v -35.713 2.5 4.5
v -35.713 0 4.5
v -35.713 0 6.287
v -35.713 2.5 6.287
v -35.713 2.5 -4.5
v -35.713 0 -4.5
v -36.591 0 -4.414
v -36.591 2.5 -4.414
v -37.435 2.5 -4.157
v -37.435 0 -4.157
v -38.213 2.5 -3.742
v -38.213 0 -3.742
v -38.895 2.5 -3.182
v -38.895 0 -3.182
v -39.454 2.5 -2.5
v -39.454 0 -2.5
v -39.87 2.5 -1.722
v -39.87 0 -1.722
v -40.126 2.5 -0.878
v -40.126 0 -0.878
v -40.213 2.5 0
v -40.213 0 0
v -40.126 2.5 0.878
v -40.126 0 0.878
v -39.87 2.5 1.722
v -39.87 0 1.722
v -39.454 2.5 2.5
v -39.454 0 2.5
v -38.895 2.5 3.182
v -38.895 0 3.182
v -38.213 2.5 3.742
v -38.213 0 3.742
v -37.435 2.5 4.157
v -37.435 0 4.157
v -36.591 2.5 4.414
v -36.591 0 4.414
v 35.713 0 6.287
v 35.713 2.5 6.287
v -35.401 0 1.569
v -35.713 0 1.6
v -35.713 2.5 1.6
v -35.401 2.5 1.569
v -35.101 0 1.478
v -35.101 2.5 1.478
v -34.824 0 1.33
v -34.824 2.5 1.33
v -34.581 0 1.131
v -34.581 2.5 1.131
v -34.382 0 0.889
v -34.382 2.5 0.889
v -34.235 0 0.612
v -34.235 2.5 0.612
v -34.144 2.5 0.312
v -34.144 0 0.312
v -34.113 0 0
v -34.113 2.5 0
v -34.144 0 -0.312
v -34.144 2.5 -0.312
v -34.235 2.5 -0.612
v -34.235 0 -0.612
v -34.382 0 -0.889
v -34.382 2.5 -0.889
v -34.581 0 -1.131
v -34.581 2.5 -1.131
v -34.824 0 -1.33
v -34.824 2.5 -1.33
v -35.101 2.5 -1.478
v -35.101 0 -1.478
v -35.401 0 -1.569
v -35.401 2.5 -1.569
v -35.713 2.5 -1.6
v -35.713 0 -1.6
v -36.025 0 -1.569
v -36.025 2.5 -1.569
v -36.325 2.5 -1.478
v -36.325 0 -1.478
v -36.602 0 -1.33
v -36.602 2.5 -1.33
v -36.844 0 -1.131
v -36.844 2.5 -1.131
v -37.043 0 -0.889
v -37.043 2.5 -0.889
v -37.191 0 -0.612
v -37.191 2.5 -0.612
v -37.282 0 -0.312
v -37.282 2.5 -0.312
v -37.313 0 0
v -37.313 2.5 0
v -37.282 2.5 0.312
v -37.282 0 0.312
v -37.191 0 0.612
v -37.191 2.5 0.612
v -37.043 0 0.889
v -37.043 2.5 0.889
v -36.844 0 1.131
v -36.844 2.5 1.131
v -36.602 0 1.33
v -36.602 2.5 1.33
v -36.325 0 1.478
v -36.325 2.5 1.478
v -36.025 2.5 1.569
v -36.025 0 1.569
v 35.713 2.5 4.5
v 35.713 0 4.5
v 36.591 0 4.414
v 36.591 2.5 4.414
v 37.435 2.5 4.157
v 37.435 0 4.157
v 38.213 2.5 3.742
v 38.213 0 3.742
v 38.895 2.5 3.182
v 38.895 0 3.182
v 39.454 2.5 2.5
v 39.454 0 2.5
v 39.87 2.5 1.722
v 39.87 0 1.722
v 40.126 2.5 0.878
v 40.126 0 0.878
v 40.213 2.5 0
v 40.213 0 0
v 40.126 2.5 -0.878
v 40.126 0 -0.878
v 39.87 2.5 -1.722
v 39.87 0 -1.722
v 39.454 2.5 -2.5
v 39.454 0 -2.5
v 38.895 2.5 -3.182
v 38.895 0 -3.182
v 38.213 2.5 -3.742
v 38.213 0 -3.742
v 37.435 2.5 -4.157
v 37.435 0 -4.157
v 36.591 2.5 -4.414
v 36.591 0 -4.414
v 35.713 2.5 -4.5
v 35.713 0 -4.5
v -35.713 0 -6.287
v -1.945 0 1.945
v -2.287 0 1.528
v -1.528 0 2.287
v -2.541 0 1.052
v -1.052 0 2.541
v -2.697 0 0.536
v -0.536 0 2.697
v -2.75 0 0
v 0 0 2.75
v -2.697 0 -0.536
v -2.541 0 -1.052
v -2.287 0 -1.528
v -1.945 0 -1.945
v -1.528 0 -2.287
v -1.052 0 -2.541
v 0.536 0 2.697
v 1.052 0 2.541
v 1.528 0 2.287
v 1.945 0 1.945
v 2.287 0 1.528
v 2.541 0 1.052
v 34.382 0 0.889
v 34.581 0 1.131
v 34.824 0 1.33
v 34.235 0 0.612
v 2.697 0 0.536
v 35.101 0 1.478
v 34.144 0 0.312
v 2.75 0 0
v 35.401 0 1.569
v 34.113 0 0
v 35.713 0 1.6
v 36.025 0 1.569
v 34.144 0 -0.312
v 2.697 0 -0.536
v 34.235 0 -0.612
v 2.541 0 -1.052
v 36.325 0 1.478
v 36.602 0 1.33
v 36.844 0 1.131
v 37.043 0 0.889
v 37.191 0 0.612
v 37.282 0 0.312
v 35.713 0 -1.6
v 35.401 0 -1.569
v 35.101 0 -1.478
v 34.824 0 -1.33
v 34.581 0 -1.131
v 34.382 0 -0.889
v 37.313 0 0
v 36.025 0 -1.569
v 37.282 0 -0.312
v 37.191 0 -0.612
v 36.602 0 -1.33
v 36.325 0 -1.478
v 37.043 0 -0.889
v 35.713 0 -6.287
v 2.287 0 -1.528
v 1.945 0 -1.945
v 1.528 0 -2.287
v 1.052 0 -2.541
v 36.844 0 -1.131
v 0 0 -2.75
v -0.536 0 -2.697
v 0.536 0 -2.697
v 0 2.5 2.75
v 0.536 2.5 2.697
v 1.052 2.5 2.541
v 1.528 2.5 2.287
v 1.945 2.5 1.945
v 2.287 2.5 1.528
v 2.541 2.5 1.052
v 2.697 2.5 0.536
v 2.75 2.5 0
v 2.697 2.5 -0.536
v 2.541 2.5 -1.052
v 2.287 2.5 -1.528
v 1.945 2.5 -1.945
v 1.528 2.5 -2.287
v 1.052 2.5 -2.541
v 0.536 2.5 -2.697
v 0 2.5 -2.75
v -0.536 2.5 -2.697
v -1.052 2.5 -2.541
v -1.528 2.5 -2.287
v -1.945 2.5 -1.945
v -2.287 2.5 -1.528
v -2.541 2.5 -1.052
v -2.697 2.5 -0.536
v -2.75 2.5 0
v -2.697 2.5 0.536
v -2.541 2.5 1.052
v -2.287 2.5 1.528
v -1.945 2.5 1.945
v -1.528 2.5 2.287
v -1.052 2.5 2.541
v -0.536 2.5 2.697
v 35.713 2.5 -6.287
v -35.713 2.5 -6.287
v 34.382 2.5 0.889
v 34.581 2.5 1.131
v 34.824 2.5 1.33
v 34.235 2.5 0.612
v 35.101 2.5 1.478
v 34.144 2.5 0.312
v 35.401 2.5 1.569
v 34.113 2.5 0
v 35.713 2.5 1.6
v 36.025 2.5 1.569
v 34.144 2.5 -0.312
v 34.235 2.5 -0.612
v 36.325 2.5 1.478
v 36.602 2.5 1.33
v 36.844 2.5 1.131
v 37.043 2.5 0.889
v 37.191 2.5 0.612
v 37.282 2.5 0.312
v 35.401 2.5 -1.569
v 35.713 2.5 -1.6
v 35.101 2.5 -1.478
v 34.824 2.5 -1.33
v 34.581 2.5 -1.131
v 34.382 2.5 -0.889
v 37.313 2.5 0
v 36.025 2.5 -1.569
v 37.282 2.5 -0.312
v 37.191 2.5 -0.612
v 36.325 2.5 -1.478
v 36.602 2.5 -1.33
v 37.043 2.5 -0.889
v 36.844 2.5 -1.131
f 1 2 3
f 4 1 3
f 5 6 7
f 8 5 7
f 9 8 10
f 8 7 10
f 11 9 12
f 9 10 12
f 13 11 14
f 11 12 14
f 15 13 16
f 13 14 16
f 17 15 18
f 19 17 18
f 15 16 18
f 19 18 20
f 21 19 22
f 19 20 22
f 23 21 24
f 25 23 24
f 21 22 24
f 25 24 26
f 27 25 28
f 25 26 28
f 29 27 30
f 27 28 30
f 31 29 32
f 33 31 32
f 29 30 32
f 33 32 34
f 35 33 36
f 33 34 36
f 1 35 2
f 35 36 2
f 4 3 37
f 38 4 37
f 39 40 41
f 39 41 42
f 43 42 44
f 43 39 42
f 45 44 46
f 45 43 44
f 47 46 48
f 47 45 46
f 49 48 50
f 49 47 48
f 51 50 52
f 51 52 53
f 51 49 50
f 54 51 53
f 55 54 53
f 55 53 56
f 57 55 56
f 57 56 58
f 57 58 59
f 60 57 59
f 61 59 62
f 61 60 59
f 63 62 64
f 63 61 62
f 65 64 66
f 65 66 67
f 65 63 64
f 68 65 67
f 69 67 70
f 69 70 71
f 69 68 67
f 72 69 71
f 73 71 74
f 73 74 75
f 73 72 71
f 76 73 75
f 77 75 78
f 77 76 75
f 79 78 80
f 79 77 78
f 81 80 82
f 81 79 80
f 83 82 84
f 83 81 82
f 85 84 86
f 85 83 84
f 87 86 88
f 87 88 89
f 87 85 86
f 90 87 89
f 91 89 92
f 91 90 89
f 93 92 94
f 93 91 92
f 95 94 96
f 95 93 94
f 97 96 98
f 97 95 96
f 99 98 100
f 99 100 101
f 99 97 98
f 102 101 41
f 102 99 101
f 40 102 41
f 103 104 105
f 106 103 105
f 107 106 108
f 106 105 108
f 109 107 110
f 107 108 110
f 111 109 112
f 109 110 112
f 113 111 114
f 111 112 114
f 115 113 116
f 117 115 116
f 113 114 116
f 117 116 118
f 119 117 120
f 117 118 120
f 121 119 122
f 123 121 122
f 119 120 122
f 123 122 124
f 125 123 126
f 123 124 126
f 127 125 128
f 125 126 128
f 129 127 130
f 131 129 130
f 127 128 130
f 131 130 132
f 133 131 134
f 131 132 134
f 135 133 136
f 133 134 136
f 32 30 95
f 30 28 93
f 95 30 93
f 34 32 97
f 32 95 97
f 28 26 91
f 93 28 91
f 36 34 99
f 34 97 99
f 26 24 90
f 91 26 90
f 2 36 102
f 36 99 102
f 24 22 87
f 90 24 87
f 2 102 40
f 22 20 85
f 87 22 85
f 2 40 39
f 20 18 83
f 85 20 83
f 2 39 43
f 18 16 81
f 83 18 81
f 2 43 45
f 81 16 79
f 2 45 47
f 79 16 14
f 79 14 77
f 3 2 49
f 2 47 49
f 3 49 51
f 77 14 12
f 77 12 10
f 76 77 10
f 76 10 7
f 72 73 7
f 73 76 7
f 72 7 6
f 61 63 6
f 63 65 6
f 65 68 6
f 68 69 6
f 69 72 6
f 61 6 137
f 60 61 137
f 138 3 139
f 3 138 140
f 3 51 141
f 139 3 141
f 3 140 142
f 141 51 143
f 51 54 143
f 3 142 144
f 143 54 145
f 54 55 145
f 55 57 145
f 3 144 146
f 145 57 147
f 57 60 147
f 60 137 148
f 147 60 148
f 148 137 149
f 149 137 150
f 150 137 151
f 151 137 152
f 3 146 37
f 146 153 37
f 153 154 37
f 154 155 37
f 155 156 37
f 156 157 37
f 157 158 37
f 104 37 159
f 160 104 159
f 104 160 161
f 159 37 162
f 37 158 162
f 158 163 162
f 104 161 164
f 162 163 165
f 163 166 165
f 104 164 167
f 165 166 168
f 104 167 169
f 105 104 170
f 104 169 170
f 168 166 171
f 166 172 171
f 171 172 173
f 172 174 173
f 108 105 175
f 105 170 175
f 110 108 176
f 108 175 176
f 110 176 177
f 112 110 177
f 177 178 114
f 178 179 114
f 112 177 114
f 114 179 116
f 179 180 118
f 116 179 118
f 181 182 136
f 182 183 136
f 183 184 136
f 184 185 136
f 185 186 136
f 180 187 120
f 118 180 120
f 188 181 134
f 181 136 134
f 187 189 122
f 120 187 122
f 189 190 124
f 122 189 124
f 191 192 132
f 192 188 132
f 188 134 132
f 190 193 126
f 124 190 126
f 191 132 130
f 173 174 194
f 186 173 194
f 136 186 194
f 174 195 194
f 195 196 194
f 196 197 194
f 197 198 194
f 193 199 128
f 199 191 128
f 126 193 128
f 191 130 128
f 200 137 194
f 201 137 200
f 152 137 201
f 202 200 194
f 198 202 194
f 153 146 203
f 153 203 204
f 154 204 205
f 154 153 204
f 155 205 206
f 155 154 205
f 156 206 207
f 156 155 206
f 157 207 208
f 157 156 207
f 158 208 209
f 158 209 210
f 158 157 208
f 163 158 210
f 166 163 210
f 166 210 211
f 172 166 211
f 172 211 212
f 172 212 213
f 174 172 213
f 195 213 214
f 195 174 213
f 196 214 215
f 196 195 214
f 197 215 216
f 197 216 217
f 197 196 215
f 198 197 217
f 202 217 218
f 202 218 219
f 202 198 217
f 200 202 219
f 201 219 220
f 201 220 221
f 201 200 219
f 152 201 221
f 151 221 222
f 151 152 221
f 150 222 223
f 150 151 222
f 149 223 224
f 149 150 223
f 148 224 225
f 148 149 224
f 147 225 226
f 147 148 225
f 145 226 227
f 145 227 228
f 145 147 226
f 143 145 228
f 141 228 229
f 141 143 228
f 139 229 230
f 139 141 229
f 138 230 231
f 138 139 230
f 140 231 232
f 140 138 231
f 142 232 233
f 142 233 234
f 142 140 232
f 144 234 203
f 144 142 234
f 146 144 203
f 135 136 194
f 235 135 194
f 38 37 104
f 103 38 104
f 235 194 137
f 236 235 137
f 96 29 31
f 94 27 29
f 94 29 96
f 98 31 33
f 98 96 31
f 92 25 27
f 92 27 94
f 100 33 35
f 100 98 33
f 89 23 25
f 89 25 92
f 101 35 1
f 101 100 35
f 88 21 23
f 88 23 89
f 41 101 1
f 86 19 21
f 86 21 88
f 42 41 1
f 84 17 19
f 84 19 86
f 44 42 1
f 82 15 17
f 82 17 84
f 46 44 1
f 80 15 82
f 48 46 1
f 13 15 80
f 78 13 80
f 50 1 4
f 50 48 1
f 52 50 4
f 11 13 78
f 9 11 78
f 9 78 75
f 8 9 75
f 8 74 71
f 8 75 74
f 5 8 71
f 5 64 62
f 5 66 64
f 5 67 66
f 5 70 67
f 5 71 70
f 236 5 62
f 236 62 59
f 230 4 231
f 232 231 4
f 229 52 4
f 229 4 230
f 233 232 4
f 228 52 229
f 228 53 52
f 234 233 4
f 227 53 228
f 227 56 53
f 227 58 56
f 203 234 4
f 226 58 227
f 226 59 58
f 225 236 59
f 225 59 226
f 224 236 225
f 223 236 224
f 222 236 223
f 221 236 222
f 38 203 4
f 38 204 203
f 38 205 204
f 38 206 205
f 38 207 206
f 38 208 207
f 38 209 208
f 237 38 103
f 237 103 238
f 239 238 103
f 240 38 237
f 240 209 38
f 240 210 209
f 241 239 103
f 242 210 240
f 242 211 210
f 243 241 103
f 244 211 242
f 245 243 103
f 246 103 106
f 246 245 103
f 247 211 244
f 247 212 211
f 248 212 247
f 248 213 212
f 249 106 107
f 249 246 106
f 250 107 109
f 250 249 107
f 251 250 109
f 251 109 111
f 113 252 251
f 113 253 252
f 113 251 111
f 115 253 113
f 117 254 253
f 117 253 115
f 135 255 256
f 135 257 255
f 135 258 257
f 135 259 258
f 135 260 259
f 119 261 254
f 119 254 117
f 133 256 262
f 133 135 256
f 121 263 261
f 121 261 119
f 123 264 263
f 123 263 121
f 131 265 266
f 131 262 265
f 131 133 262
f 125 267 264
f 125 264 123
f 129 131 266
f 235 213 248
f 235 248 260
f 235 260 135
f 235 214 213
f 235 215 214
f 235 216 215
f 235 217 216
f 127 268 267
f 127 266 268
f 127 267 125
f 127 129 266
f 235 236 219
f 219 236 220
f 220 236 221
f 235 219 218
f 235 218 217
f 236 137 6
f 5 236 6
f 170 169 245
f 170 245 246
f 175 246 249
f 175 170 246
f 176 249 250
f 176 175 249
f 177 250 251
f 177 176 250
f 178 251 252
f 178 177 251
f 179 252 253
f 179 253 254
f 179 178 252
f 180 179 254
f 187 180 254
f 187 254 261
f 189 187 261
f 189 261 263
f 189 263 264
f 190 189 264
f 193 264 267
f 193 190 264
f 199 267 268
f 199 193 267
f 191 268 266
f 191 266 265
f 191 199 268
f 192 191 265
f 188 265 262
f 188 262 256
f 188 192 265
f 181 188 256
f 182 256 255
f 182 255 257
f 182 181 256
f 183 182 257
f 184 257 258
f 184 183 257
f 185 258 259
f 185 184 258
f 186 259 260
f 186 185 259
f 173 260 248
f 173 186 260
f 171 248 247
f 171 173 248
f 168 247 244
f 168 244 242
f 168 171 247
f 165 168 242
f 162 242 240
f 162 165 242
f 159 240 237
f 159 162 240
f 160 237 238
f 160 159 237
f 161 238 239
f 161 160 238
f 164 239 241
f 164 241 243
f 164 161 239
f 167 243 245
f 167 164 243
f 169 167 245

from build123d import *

# Parameters (mm, degrees)
SKETCH1_R           = 1.6
SKETCH1_R_2         = 2.75
BOSS_EXTRUDE1_DEPTH = 2.5


with BuildPart() as part:
    # Sketch1 → Boss-Extrude1 (new body)
    with BuildSketch(Plane(origin=(0, 0, 0), x_dir=(1, 0, 0), z_dir=(0, 1, 0))):
        with BuildLine():
            Line((35.712808515, 6.287191485), (-35.712808515, 6.287191485))
            Line((-35.712808515, 6.287191485), (-35.712808515, 4.5))
            ThreePointArc((-35.712808515, 4.5), (-40.212808515, 0), (-35.712808515, -4.5))
            Line((-35.712808515, -4.5), (-35.712808515, -6.287191485))
            Line((-35.712808515, -6.287191485), (35.712808515, -6.287191485))
            Line((35.712808515, -6.287191485), (35.712808515, -4.5))
            ThreePointArc((35.712808515, -4.5), (40.212808515, 0), (35.712808515, 4.5))
            Line((35.712808515, 4.5), (35.712808515, 6.287191485))
        make_face()
        with Locations(Location((35.712808515, 0, 0), (0, 0, 270))):
            Circle(SKETCH1_R, mode=Mode.SUBTRACT)
        with Locations(Location((0, 0, 0), (0, 0, 270))):
            Circle(SKETCH1_R_2, mode=Mode.SUBTRACT)
        with Locations(Location((-35.712808515, 0, 0), (0, 0, 270))):
            Circle(SKETCH1_R, mode=Mode.SUBTRACT)
    extrude(amount=BOSS_EXTRUDE1_DEPTH)


solid = part.part
